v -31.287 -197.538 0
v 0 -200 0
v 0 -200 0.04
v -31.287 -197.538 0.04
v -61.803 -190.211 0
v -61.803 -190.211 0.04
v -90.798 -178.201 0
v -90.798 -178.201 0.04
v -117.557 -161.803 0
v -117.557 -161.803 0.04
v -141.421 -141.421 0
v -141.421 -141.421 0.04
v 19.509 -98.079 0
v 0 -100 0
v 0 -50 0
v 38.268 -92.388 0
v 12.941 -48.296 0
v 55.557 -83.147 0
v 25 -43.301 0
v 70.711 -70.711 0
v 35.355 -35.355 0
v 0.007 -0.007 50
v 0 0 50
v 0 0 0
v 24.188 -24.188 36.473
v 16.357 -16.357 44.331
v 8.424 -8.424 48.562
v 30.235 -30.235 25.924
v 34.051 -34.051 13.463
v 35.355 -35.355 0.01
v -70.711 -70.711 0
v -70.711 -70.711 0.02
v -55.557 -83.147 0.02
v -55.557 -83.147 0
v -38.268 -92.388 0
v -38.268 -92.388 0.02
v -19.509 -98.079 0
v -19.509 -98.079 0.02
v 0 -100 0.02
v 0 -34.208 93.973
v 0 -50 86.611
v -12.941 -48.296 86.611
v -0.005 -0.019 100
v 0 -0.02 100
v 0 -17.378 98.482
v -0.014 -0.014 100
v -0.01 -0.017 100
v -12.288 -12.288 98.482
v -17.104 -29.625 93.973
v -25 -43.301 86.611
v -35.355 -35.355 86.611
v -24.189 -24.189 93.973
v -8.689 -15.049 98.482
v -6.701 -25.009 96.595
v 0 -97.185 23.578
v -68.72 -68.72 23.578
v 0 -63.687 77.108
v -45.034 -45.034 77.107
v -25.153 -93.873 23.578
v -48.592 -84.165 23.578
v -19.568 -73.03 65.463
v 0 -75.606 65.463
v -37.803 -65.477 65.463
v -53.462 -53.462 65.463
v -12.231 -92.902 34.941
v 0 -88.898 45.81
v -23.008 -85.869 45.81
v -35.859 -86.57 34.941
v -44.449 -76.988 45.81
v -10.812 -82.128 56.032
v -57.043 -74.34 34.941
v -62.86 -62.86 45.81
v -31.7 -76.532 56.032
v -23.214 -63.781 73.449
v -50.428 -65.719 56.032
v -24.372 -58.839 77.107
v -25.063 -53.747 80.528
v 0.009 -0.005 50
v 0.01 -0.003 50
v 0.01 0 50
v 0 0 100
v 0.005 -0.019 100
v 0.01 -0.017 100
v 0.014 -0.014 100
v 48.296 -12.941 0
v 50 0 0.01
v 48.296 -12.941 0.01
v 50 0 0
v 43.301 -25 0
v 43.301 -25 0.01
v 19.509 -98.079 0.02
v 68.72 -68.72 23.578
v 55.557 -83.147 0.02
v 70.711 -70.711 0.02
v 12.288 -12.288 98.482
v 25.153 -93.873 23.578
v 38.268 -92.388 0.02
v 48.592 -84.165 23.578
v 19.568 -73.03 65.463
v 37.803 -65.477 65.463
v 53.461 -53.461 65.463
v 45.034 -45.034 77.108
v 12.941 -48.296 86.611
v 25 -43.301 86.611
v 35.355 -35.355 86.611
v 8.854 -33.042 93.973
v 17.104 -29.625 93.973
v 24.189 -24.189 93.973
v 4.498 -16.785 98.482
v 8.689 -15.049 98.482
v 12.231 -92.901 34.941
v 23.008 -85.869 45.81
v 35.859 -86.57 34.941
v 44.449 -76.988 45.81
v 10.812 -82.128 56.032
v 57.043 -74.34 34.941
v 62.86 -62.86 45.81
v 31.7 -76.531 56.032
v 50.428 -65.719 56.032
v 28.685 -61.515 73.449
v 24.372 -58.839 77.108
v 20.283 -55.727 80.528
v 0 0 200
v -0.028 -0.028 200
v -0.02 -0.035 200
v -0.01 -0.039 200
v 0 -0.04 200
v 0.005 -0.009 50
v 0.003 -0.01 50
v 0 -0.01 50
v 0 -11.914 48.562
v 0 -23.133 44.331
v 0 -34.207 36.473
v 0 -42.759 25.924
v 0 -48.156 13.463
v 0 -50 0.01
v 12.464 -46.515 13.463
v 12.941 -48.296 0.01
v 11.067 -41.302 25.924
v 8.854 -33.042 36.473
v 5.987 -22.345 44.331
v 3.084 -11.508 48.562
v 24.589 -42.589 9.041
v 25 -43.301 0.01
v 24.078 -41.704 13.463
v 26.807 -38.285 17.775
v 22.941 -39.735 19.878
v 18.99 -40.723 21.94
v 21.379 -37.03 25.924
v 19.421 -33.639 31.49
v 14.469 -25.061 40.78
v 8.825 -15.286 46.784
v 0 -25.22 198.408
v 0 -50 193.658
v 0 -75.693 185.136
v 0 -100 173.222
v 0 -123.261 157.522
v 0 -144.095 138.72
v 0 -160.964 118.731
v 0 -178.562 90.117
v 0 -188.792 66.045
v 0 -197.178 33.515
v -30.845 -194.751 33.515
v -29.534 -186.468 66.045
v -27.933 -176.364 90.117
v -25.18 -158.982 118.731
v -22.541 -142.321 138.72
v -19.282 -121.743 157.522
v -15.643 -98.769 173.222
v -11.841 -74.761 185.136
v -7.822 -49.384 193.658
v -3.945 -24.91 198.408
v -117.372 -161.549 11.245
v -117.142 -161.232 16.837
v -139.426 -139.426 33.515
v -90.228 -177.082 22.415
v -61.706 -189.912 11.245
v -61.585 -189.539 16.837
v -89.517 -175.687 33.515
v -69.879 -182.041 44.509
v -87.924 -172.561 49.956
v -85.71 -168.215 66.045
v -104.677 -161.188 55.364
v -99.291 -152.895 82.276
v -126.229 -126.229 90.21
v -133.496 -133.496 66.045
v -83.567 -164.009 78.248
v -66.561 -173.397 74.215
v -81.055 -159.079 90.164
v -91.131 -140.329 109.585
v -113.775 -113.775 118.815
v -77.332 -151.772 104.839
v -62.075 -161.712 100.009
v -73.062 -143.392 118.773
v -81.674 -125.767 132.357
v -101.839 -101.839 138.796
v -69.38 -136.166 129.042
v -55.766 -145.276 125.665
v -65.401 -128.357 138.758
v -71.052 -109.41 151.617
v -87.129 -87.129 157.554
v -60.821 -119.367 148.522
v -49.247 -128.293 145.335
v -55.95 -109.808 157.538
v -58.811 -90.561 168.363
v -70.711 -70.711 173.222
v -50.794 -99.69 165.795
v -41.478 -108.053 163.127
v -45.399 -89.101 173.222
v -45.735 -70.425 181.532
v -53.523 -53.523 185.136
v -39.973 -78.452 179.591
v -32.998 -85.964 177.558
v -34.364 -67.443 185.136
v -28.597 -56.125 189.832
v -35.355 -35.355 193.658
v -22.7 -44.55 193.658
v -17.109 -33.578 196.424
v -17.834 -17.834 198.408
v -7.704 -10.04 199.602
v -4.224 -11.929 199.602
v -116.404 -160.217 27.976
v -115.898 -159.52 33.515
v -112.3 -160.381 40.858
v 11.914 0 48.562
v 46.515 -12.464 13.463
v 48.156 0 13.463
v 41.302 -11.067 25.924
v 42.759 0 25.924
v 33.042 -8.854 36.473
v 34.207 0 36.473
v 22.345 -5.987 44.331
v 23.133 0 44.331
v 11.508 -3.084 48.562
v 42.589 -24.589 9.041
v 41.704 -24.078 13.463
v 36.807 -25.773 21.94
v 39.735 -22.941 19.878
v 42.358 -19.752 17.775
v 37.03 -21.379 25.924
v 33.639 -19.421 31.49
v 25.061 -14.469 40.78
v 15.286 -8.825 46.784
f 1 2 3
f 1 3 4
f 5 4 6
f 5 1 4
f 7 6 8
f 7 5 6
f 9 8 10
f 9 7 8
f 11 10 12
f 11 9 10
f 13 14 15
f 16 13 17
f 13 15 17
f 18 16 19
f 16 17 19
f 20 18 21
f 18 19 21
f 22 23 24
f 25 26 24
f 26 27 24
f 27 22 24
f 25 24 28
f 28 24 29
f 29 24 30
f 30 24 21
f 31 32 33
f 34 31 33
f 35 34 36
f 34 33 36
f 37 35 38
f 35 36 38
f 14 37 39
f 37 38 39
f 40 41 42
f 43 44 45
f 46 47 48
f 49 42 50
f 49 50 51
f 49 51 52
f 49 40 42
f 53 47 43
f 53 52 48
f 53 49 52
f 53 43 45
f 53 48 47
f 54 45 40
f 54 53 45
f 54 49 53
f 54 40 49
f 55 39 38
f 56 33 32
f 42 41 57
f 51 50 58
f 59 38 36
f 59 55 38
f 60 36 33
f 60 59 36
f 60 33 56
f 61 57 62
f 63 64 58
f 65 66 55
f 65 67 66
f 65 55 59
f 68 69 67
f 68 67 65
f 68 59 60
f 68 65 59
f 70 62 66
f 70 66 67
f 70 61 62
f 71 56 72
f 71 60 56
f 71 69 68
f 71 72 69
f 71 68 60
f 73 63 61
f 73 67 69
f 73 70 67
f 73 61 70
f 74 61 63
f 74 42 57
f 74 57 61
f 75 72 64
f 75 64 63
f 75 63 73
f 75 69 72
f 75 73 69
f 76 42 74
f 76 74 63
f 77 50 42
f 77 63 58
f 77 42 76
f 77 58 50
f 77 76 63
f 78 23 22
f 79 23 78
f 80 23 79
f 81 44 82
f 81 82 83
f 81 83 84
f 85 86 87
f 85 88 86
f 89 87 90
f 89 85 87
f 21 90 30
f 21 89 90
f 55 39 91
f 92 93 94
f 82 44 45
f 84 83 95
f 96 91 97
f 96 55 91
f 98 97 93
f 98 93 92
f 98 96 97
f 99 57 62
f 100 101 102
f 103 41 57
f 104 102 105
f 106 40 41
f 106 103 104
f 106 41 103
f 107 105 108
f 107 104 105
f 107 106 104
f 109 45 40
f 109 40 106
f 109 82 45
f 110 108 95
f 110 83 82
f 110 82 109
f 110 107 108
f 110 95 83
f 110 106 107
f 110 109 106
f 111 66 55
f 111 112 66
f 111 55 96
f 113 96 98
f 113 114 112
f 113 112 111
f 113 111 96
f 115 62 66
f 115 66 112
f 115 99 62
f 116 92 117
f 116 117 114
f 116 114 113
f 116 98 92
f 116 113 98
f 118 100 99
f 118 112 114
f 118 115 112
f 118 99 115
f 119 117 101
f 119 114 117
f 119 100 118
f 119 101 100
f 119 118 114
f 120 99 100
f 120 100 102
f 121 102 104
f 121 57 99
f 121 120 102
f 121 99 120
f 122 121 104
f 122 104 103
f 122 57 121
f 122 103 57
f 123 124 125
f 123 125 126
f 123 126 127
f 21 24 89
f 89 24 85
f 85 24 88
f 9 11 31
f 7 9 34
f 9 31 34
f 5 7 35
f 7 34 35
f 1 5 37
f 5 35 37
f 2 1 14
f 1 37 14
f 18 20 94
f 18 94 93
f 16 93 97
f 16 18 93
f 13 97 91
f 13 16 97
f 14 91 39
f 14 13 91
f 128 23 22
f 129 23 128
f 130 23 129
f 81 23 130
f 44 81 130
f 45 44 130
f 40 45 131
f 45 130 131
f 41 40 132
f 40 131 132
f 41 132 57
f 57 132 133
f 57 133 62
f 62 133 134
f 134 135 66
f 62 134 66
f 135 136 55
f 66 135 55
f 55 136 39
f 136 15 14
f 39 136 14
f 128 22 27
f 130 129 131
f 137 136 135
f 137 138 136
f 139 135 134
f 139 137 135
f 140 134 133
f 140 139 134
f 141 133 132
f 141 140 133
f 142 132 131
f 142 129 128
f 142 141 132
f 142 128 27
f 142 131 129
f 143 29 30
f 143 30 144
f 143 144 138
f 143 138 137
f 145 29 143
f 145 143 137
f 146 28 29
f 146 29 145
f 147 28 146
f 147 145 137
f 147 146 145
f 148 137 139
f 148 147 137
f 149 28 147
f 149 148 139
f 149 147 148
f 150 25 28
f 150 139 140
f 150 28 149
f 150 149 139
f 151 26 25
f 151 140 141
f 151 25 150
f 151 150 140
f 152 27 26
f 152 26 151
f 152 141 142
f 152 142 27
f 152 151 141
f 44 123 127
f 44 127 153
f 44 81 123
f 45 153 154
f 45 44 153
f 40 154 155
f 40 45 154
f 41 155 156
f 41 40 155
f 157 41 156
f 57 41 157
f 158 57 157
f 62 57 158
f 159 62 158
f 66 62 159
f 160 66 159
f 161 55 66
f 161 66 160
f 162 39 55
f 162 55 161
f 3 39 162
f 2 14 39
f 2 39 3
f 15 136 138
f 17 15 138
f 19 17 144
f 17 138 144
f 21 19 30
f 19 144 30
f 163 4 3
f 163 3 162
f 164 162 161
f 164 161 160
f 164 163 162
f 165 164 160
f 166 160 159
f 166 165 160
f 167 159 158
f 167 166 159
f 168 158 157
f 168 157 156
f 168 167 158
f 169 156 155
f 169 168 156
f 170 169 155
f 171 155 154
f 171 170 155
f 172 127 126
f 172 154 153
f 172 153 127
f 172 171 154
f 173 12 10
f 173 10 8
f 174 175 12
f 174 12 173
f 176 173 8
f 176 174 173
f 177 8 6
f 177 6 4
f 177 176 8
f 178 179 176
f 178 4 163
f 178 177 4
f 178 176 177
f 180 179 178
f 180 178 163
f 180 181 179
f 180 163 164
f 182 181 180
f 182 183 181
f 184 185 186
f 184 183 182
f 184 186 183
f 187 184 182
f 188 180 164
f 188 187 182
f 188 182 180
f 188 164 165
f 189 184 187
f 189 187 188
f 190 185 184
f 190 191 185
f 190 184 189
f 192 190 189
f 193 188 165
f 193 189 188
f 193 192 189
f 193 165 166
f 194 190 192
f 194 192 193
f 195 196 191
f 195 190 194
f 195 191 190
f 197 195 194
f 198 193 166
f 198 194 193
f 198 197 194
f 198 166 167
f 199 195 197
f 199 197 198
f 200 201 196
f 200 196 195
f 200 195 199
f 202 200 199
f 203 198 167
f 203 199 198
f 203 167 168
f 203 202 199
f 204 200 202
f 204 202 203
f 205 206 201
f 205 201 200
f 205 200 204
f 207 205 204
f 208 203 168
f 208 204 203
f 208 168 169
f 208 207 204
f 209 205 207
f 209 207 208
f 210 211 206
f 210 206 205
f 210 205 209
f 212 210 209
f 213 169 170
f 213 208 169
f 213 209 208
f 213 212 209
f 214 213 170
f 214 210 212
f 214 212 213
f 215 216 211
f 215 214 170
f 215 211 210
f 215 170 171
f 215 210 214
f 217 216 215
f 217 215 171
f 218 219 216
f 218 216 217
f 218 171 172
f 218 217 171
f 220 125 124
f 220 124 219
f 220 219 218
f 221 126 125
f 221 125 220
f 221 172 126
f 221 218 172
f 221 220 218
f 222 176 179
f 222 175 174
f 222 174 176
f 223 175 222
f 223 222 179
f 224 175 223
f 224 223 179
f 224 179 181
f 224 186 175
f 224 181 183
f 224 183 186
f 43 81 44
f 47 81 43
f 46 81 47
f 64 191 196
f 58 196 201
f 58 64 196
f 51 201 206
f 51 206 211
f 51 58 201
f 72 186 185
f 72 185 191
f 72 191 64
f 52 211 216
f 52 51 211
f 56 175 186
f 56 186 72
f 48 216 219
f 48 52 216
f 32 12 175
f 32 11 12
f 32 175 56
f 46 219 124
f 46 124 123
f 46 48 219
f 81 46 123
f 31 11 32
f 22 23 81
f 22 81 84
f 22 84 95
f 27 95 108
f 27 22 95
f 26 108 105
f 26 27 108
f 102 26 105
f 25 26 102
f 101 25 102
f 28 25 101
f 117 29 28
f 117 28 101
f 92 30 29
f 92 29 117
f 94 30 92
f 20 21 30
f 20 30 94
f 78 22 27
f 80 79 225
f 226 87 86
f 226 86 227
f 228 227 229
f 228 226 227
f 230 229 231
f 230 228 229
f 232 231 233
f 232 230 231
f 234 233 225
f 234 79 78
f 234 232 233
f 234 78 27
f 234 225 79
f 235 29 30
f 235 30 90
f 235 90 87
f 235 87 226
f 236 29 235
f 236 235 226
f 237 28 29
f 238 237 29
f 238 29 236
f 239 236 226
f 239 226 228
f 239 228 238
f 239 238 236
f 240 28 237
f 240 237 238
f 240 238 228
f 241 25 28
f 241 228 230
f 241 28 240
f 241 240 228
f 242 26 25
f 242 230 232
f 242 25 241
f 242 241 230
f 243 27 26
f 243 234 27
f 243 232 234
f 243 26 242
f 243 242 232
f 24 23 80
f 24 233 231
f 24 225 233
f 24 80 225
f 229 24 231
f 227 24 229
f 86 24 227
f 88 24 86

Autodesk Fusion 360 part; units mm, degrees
sketch "Sketch2" plane through (0, 0, 0) normal (0, 0, 1) x (1, 0, 0)
  circle A0 centre (0, 0) radius 200
  line L0 (0, 200) -> (0, -200)
  line L1 (-200, 0) -> (200, 0)
  line L2 (-141.4214, 141.4214) -> (141.4214, -141.4214)
  line L3 (-141.4214, -141.4214) -> (141.4214, 141.4214)
  line L4 (0, -200) -> (0, 200)
  line L5 (-200, 0) -> (200, 0)
  circle A1 centre (0, 0) radius 50
  circle A2 centre (0, 0) radius 100
  dimension "d7" = 400
  dimension "d8" = 45
  dimension "d9" = 45
  dimension "d10" = 100
  dimension "d11" = 200
extrude "Extrude1" add sketch "Sketch2" along normal blind 50 contours L1 L2 L5 A1 picked at (27.6563, -18.4794) makes body 1 in component "Small"
extrude "Extrude1'" add sketch "Sketch2" along normal blind 100 separate body contours L0 L2 L4 A1 A2 | L0 L2 L4 A1 picked at (55.6474, -61.8005) picked at (10.6917, -31.4968) makes body 2 in component "Medium"
extrude "Extrude1''" add sketch "Sketch2" along normal blind 200 separate body contours A0 L0 L3 L4 A2 | L0 L3 L4 A1 A2 | L0 L3 L4 A1 picked at (-8.7017, -166.0963) picked at (-37.7561, -74.0973) picked at (-10.6917, -31.4968) makes body 3 in component "Large"
fillet "Fillet1" radius 50 1 edges at (46.194, -19.1342, 50) on bodies 1 in component "Small"
fillet "Fillet2" radius 100 1 edges at (38.2683, -92.388, 100) on bodies 2 in component "Medium"
fillet "Fillet1'" radius 200 1 edges at (-76.5367, -184.7759, 200) on bodies 3 in component "Large"
revolve "Revolve1" cut 1 faces at (23.461, -23.461, 2.2699) angle 180 about axis through (0, 0, 1.75) along (0, 0, -1) on bodies 1 bodies 2 in component "Medium"
revolve "Revolve1'" cut 1 faces at (23.461, -23.461, 2.2699) angle 180 about axis through (0, 0, 1.75) along (0, 0, -1) on bodies 1 bodies 3 in component "Large"
revolve "Revolve2" cut 1 faces at (0, -37.0989, 74.4235) angle 180 about axis through (0, 0, 1.75) along (0, 0, -1) on bodies 2 bodies 3 in component "Large"
component "Small" placed x (1, 0, 0) y (0, 1, 0) z (0, 0, 1) at (0, 0, 0)
component "Medium" placed x (1, 0, 0) y (0, 1, 0) z (0, 0, 1) at (0, 0, 0)
component "Large" placed x (1, 0, 0) y (0, 1, 0) z (0, 0, 1) at (0, 0, 0)
